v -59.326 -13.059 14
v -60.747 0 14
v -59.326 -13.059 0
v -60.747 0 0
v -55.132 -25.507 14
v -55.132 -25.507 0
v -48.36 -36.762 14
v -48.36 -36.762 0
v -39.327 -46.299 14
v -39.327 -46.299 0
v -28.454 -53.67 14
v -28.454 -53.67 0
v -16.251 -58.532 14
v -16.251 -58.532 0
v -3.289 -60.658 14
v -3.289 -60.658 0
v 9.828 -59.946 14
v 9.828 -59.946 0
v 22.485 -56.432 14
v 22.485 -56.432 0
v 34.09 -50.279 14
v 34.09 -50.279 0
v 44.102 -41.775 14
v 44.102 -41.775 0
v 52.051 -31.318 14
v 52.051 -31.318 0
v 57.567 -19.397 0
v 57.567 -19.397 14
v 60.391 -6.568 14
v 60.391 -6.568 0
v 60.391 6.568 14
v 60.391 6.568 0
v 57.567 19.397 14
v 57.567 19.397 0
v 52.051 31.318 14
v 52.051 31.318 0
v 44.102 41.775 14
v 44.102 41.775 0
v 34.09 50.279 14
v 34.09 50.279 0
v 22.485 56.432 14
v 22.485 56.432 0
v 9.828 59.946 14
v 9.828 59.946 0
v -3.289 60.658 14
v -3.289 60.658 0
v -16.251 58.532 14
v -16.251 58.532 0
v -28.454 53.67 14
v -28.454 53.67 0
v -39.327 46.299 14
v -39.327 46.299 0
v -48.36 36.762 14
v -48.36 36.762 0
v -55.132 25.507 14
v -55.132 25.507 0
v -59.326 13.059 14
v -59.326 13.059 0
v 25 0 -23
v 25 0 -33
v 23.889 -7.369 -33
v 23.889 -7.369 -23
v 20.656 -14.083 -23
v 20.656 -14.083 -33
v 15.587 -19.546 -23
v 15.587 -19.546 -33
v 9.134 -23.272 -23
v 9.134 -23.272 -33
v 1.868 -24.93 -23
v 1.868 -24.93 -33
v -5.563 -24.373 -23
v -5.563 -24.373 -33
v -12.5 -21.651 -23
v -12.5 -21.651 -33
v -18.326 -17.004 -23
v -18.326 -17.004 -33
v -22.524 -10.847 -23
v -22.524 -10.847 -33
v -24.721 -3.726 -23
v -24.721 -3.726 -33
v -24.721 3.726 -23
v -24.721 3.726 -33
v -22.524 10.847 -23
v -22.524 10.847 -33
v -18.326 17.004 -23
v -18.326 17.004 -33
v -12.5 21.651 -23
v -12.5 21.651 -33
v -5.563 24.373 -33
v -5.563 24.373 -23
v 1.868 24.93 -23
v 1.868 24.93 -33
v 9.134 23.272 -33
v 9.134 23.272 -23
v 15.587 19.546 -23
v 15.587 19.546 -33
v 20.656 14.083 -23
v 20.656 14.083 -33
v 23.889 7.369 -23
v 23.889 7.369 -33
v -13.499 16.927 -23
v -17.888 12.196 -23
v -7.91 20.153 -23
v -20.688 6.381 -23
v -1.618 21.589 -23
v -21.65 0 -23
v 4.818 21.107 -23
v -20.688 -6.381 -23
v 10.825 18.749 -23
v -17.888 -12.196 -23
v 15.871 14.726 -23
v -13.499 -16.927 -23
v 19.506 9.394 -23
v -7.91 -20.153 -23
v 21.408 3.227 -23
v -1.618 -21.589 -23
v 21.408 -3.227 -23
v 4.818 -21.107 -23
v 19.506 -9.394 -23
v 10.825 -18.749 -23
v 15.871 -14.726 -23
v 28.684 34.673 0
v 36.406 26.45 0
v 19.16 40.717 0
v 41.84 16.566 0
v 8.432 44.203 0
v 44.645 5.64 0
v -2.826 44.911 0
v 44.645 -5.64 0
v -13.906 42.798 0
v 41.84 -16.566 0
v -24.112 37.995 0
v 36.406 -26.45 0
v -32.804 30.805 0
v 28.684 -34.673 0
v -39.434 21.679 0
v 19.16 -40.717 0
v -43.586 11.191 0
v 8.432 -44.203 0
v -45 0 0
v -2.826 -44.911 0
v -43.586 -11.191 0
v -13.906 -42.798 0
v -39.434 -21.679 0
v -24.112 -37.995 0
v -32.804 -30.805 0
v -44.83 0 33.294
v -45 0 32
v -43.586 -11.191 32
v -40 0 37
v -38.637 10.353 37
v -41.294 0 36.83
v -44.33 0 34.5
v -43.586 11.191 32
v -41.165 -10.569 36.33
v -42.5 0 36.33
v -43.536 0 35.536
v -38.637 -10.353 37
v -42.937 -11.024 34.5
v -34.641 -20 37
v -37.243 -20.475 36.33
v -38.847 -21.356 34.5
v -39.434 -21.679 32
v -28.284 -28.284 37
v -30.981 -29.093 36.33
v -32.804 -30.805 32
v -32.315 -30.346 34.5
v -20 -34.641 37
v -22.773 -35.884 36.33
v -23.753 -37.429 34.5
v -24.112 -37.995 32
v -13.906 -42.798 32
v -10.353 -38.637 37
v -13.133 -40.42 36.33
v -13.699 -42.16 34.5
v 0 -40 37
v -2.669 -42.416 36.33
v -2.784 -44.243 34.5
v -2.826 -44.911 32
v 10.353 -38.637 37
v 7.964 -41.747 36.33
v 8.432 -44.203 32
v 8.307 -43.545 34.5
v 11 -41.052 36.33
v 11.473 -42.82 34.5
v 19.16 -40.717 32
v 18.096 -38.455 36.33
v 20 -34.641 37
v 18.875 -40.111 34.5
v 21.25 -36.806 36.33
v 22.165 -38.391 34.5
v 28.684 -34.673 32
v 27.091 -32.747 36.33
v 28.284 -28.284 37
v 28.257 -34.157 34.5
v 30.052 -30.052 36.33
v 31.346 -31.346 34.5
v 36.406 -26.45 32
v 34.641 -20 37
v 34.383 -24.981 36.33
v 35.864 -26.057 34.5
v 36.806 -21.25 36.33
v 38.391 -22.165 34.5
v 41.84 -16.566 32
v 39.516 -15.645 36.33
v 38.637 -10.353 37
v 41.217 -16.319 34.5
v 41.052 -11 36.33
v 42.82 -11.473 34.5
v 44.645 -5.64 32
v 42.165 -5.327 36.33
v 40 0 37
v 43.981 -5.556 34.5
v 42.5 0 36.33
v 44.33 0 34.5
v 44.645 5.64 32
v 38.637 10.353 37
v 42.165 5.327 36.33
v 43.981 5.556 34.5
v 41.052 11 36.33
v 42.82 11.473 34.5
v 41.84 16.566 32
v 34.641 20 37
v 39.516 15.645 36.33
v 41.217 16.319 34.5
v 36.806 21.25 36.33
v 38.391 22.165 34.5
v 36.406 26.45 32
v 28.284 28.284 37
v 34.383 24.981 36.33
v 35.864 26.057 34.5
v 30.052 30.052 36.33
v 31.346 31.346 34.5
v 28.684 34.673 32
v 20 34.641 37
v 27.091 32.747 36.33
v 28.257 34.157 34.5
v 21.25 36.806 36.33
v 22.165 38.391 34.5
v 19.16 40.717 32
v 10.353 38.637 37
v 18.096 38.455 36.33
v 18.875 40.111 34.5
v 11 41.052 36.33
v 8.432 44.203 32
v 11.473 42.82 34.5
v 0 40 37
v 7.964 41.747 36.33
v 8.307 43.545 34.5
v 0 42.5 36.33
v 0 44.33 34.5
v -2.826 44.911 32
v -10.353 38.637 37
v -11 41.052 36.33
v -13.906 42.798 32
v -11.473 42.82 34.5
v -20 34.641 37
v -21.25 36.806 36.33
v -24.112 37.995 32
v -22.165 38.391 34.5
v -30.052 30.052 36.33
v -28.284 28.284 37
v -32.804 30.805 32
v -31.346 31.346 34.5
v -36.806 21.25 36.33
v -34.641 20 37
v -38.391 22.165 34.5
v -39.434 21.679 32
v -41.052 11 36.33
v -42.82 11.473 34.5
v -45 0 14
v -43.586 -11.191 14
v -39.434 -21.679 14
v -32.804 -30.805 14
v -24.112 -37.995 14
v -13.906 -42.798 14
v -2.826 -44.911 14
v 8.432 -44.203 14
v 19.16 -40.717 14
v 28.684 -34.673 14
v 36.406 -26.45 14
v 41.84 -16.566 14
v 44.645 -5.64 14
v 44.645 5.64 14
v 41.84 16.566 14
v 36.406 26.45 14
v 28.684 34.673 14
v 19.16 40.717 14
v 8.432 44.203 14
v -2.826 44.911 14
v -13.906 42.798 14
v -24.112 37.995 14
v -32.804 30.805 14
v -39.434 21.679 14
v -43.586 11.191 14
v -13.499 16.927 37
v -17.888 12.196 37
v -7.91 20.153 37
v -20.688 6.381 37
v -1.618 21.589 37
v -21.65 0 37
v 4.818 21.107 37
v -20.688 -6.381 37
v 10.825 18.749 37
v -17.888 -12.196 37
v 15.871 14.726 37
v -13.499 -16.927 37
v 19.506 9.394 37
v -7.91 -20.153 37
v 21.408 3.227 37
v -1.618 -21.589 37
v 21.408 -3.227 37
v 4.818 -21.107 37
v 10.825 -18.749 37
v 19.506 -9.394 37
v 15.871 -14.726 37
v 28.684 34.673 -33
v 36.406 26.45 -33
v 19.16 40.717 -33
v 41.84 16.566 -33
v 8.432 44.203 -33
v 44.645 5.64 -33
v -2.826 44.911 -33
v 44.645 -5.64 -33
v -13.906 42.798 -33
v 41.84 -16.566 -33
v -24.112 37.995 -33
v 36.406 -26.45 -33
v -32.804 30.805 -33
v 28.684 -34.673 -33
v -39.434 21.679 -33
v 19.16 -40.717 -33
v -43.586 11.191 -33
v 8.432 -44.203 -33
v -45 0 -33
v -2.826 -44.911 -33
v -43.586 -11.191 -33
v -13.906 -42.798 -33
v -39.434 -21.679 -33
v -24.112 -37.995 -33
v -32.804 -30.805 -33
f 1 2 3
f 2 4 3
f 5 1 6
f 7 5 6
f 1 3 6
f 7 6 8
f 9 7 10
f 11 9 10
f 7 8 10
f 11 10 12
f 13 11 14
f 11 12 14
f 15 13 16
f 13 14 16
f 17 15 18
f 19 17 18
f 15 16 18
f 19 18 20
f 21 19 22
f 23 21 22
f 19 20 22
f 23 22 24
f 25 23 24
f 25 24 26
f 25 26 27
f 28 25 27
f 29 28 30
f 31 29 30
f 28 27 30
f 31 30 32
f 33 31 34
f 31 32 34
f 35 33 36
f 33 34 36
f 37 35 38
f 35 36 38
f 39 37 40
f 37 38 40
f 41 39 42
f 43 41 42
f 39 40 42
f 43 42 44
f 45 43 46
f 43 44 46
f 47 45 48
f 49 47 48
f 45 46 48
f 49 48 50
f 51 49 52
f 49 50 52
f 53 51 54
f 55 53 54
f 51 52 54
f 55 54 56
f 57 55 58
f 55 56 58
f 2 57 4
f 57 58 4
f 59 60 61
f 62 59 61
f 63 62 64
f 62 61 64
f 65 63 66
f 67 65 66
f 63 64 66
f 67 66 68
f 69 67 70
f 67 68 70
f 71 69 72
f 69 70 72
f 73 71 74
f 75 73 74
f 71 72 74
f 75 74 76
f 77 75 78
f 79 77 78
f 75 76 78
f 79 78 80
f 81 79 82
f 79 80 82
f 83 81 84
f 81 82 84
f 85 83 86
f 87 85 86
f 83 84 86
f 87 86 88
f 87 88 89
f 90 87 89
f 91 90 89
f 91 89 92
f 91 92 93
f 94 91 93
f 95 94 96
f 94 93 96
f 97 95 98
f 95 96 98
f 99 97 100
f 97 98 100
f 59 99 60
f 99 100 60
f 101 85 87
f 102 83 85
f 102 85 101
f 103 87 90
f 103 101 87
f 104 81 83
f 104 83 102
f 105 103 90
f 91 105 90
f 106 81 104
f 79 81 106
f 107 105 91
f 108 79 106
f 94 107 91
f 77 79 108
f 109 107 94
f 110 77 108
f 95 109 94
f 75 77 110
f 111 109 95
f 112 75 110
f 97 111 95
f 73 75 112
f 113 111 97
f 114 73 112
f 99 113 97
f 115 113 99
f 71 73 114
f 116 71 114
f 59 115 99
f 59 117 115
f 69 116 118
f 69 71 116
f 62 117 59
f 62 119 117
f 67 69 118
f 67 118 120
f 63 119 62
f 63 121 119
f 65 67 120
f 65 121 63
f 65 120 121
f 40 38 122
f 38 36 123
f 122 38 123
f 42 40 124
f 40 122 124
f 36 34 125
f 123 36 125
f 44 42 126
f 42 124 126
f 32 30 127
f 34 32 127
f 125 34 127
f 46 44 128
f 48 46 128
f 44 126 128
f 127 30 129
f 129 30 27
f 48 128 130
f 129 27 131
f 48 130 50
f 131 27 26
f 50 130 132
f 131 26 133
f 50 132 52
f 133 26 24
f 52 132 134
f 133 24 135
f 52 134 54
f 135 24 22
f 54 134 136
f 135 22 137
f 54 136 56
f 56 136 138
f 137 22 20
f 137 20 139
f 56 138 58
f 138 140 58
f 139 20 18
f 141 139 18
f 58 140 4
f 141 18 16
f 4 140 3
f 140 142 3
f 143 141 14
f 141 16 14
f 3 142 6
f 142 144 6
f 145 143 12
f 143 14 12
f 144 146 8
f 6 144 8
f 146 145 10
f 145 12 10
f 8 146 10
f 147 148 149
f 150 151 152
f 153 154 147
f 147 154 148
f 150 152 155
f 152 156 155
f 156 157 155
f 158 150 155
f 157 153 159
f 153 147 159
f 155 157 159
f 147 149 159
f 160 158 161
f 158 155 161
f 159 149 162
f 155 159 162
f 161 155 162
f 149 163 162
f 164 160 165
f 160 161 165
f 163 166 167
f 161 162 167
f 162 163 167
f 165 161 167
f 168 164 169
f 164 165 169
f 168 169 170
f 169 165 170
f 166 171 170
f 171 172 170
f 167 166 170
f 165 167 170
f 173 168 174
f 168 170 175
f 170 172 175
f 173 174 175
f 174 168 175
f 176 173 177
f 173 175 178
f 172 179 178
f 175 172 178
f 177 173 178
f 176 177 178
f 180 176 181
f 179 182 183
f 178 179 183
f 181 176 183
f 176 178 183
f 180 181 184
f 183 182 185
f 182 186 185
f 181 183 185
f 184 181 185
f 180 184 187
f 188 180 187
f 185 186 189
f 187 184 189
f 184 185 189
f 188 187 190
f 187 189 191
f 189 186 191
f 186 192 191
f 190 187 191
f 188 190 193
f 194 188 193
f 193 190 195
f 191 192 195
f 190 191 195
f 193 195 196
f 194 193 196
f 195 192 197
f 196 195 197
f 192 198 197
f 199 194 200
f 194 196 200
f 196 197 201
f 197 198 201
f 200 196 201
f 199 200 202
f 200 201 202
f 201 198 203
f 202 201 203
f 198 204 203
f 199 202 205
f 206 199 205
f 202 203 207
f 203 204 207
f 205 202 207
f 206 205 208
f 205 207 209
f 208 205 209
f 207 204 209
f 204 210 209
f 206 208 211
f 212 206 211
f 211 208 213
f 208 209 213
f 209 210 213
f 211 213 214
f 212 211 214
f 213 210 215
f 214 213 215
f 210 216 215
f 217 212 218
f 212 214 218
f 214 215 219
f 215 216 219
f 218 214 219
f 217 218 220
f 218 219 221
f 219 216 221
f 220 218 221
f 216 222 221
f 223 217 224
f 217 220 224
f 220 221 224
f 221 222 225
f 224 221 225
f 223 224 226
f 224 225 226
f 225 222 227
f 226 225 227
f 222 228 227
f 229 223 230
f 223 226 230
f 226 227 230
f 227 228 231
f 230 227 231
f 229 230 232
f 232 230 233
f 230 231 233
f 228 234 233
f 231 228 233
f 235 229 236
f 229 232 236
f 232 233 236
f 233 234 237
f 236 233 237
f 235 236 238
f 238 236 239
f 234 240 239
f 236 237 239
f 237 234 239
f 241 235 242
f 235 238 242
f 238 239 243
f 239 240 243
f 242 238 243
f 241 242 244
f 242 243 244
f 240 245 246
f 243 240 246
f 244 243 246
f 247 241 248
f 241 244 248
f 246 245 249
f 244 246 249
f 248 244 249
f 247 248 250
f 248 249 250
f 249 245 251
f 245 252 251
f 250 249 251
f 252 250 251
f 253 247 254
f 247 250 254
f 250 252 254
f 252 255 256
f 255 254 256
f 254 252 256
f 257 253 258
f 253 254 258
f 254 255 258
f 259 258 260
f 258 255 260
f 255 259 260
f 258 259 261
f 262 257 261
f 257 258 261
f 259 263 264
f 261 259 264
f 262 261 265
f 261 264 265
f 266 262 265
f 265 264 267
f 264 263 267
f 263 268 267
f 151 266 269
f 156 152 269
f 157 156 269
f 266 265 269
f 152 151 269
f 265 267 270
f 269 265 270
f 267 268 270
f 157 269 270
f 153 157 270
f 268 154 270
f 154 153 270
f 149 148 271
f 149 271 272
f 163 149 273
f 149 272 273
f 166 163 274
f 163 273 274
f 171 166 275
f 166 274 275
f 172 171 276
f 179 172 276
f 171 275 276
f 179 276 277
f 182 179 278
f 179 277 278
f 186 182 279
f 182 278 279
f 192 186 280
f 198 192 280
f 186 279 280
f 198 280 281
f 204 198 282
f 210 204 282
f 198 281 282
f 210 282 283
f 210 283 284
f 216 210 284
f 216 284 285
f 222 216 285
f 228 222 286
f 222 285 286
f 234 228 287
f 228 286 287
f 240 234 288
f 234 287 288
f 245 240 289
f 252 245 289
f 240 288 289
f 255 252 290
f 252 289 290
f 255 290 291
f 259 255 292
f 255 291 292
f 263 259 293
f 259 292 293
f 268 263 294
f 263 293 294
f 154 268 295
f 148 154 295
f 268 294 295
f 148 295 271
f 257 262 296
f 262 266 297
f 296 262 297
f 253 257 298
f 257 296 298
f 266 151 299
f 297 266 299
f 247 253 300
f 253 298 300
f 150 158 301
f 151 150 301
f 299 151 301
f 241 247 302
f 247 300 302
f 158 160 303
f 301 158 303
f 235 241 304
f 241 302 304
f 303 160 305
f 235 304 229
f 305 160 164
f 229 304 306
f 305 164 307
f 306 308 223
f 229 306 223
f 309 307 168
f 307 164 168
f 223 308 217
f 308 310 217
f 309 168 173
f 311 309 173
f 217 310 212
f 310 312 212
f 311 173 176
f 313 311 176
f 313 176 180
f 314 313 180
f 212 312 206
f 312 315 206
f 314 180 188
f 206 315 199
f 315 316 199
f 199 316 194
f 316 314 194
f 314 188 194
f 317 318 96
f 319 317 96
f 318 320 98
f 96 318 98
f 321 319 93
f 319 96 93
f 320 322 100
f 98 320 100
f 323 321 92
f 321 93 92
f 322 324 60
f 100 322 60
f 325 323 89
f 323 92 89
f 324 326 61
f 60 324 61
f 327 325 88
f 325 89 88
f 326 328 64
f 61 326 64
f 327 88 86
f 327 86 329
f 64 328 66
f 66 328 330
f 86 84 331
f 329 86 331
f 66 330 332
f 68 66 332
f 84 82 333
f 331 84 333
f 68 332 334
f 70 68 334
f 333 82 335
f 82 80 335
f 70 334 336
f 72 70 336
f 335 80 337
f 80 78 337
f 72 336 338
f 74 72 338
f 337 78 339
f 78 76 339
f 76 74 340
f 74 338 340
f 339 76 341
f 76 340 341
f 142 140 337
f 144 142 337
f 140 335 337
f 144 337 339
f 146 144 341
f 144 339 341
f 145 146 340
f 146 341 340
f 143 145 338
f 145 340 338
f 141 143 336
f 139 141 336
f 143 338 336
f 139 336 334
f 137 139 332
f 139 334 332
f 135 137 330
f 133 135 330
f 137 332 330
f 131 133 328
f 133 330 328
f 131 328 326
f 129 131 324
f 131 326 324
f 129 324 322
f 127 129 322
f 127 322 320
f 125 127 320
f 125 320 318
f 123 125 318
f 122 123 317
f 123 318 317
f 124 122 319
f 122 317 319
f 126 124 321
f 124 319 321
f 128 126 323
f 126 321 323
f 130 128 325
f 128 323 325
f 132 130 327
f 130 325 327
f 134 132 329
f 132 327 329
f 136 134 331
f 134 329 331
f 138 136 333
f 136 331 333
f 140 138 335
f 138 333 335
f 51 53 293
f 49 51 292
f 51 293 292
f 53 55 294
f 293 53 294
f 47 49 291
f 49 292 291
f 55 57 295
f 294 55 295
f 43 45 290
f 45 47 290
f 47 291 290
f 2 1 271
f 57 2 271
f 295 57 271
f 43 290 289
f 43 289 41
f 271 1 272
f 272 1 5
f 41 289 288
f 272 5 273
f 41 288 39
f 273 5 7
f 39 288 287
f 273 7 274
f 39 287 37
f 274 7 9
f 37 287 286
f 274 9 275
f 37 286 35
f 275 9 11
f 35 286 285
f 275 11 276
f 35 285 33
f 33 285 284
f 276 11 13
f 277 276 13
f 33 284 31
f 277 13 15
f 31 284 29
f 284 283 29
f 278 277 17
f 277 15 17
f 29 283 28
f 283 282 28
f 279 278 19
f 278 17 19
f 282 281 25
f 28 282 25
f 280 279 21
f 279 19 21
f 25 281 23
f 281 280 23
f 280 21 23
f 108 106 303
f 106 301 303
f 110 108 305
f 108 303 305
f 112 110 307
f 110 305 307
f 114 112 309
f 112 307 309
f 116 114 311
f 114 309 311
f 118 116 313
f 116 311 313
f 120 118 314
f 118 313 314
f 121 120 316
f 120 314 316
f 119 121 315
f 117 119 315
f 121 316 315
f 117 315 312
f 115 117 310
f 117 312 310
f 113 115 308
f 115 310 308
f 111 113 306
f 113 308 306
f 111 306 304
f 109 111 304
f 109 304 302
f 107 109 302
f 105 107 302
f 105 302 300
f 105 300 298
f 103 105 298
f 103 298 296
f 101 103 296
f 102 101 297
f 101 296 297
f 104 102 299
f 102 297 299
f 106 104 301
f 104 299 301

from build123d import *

# Parameters (mm, degrees)
F2_R     = 5
F3_R     = 25
F4_DEPTH = 10


with BuildPart() as f1:
    # F0 (on Front) → F1 (revolve)
    with BuildSketch(Plane.XZ):
        Polygon((-60.746692, 14), (-60.746692, 0), (-45, 0), (-45, -33), (-21.65, -33), (-21.65, 37), (-45, 37), (-45, 14), align=None)
    revolve(axis=Axis((0, 0, 28.312229), (0, 0, 1)))

    # F2
    f2_edges = [f1.edges().sort_by_distance(p)[0] for p in [
        (45, 0, 37),
    ]]
    fillet(f2_edges, radius=F2_R)

    # F3 (on face) → F4 (cut)
    with BuildSketch(Plane(origin=(0, 0, -33), x_dir=(1, 0, 0), z_dir=(0, 0, -1))):
        Circle(F3_R)
    extrude(amount=-F4_DEPTH, mode=Mode.SUBTRACT)


solid = f1.part
